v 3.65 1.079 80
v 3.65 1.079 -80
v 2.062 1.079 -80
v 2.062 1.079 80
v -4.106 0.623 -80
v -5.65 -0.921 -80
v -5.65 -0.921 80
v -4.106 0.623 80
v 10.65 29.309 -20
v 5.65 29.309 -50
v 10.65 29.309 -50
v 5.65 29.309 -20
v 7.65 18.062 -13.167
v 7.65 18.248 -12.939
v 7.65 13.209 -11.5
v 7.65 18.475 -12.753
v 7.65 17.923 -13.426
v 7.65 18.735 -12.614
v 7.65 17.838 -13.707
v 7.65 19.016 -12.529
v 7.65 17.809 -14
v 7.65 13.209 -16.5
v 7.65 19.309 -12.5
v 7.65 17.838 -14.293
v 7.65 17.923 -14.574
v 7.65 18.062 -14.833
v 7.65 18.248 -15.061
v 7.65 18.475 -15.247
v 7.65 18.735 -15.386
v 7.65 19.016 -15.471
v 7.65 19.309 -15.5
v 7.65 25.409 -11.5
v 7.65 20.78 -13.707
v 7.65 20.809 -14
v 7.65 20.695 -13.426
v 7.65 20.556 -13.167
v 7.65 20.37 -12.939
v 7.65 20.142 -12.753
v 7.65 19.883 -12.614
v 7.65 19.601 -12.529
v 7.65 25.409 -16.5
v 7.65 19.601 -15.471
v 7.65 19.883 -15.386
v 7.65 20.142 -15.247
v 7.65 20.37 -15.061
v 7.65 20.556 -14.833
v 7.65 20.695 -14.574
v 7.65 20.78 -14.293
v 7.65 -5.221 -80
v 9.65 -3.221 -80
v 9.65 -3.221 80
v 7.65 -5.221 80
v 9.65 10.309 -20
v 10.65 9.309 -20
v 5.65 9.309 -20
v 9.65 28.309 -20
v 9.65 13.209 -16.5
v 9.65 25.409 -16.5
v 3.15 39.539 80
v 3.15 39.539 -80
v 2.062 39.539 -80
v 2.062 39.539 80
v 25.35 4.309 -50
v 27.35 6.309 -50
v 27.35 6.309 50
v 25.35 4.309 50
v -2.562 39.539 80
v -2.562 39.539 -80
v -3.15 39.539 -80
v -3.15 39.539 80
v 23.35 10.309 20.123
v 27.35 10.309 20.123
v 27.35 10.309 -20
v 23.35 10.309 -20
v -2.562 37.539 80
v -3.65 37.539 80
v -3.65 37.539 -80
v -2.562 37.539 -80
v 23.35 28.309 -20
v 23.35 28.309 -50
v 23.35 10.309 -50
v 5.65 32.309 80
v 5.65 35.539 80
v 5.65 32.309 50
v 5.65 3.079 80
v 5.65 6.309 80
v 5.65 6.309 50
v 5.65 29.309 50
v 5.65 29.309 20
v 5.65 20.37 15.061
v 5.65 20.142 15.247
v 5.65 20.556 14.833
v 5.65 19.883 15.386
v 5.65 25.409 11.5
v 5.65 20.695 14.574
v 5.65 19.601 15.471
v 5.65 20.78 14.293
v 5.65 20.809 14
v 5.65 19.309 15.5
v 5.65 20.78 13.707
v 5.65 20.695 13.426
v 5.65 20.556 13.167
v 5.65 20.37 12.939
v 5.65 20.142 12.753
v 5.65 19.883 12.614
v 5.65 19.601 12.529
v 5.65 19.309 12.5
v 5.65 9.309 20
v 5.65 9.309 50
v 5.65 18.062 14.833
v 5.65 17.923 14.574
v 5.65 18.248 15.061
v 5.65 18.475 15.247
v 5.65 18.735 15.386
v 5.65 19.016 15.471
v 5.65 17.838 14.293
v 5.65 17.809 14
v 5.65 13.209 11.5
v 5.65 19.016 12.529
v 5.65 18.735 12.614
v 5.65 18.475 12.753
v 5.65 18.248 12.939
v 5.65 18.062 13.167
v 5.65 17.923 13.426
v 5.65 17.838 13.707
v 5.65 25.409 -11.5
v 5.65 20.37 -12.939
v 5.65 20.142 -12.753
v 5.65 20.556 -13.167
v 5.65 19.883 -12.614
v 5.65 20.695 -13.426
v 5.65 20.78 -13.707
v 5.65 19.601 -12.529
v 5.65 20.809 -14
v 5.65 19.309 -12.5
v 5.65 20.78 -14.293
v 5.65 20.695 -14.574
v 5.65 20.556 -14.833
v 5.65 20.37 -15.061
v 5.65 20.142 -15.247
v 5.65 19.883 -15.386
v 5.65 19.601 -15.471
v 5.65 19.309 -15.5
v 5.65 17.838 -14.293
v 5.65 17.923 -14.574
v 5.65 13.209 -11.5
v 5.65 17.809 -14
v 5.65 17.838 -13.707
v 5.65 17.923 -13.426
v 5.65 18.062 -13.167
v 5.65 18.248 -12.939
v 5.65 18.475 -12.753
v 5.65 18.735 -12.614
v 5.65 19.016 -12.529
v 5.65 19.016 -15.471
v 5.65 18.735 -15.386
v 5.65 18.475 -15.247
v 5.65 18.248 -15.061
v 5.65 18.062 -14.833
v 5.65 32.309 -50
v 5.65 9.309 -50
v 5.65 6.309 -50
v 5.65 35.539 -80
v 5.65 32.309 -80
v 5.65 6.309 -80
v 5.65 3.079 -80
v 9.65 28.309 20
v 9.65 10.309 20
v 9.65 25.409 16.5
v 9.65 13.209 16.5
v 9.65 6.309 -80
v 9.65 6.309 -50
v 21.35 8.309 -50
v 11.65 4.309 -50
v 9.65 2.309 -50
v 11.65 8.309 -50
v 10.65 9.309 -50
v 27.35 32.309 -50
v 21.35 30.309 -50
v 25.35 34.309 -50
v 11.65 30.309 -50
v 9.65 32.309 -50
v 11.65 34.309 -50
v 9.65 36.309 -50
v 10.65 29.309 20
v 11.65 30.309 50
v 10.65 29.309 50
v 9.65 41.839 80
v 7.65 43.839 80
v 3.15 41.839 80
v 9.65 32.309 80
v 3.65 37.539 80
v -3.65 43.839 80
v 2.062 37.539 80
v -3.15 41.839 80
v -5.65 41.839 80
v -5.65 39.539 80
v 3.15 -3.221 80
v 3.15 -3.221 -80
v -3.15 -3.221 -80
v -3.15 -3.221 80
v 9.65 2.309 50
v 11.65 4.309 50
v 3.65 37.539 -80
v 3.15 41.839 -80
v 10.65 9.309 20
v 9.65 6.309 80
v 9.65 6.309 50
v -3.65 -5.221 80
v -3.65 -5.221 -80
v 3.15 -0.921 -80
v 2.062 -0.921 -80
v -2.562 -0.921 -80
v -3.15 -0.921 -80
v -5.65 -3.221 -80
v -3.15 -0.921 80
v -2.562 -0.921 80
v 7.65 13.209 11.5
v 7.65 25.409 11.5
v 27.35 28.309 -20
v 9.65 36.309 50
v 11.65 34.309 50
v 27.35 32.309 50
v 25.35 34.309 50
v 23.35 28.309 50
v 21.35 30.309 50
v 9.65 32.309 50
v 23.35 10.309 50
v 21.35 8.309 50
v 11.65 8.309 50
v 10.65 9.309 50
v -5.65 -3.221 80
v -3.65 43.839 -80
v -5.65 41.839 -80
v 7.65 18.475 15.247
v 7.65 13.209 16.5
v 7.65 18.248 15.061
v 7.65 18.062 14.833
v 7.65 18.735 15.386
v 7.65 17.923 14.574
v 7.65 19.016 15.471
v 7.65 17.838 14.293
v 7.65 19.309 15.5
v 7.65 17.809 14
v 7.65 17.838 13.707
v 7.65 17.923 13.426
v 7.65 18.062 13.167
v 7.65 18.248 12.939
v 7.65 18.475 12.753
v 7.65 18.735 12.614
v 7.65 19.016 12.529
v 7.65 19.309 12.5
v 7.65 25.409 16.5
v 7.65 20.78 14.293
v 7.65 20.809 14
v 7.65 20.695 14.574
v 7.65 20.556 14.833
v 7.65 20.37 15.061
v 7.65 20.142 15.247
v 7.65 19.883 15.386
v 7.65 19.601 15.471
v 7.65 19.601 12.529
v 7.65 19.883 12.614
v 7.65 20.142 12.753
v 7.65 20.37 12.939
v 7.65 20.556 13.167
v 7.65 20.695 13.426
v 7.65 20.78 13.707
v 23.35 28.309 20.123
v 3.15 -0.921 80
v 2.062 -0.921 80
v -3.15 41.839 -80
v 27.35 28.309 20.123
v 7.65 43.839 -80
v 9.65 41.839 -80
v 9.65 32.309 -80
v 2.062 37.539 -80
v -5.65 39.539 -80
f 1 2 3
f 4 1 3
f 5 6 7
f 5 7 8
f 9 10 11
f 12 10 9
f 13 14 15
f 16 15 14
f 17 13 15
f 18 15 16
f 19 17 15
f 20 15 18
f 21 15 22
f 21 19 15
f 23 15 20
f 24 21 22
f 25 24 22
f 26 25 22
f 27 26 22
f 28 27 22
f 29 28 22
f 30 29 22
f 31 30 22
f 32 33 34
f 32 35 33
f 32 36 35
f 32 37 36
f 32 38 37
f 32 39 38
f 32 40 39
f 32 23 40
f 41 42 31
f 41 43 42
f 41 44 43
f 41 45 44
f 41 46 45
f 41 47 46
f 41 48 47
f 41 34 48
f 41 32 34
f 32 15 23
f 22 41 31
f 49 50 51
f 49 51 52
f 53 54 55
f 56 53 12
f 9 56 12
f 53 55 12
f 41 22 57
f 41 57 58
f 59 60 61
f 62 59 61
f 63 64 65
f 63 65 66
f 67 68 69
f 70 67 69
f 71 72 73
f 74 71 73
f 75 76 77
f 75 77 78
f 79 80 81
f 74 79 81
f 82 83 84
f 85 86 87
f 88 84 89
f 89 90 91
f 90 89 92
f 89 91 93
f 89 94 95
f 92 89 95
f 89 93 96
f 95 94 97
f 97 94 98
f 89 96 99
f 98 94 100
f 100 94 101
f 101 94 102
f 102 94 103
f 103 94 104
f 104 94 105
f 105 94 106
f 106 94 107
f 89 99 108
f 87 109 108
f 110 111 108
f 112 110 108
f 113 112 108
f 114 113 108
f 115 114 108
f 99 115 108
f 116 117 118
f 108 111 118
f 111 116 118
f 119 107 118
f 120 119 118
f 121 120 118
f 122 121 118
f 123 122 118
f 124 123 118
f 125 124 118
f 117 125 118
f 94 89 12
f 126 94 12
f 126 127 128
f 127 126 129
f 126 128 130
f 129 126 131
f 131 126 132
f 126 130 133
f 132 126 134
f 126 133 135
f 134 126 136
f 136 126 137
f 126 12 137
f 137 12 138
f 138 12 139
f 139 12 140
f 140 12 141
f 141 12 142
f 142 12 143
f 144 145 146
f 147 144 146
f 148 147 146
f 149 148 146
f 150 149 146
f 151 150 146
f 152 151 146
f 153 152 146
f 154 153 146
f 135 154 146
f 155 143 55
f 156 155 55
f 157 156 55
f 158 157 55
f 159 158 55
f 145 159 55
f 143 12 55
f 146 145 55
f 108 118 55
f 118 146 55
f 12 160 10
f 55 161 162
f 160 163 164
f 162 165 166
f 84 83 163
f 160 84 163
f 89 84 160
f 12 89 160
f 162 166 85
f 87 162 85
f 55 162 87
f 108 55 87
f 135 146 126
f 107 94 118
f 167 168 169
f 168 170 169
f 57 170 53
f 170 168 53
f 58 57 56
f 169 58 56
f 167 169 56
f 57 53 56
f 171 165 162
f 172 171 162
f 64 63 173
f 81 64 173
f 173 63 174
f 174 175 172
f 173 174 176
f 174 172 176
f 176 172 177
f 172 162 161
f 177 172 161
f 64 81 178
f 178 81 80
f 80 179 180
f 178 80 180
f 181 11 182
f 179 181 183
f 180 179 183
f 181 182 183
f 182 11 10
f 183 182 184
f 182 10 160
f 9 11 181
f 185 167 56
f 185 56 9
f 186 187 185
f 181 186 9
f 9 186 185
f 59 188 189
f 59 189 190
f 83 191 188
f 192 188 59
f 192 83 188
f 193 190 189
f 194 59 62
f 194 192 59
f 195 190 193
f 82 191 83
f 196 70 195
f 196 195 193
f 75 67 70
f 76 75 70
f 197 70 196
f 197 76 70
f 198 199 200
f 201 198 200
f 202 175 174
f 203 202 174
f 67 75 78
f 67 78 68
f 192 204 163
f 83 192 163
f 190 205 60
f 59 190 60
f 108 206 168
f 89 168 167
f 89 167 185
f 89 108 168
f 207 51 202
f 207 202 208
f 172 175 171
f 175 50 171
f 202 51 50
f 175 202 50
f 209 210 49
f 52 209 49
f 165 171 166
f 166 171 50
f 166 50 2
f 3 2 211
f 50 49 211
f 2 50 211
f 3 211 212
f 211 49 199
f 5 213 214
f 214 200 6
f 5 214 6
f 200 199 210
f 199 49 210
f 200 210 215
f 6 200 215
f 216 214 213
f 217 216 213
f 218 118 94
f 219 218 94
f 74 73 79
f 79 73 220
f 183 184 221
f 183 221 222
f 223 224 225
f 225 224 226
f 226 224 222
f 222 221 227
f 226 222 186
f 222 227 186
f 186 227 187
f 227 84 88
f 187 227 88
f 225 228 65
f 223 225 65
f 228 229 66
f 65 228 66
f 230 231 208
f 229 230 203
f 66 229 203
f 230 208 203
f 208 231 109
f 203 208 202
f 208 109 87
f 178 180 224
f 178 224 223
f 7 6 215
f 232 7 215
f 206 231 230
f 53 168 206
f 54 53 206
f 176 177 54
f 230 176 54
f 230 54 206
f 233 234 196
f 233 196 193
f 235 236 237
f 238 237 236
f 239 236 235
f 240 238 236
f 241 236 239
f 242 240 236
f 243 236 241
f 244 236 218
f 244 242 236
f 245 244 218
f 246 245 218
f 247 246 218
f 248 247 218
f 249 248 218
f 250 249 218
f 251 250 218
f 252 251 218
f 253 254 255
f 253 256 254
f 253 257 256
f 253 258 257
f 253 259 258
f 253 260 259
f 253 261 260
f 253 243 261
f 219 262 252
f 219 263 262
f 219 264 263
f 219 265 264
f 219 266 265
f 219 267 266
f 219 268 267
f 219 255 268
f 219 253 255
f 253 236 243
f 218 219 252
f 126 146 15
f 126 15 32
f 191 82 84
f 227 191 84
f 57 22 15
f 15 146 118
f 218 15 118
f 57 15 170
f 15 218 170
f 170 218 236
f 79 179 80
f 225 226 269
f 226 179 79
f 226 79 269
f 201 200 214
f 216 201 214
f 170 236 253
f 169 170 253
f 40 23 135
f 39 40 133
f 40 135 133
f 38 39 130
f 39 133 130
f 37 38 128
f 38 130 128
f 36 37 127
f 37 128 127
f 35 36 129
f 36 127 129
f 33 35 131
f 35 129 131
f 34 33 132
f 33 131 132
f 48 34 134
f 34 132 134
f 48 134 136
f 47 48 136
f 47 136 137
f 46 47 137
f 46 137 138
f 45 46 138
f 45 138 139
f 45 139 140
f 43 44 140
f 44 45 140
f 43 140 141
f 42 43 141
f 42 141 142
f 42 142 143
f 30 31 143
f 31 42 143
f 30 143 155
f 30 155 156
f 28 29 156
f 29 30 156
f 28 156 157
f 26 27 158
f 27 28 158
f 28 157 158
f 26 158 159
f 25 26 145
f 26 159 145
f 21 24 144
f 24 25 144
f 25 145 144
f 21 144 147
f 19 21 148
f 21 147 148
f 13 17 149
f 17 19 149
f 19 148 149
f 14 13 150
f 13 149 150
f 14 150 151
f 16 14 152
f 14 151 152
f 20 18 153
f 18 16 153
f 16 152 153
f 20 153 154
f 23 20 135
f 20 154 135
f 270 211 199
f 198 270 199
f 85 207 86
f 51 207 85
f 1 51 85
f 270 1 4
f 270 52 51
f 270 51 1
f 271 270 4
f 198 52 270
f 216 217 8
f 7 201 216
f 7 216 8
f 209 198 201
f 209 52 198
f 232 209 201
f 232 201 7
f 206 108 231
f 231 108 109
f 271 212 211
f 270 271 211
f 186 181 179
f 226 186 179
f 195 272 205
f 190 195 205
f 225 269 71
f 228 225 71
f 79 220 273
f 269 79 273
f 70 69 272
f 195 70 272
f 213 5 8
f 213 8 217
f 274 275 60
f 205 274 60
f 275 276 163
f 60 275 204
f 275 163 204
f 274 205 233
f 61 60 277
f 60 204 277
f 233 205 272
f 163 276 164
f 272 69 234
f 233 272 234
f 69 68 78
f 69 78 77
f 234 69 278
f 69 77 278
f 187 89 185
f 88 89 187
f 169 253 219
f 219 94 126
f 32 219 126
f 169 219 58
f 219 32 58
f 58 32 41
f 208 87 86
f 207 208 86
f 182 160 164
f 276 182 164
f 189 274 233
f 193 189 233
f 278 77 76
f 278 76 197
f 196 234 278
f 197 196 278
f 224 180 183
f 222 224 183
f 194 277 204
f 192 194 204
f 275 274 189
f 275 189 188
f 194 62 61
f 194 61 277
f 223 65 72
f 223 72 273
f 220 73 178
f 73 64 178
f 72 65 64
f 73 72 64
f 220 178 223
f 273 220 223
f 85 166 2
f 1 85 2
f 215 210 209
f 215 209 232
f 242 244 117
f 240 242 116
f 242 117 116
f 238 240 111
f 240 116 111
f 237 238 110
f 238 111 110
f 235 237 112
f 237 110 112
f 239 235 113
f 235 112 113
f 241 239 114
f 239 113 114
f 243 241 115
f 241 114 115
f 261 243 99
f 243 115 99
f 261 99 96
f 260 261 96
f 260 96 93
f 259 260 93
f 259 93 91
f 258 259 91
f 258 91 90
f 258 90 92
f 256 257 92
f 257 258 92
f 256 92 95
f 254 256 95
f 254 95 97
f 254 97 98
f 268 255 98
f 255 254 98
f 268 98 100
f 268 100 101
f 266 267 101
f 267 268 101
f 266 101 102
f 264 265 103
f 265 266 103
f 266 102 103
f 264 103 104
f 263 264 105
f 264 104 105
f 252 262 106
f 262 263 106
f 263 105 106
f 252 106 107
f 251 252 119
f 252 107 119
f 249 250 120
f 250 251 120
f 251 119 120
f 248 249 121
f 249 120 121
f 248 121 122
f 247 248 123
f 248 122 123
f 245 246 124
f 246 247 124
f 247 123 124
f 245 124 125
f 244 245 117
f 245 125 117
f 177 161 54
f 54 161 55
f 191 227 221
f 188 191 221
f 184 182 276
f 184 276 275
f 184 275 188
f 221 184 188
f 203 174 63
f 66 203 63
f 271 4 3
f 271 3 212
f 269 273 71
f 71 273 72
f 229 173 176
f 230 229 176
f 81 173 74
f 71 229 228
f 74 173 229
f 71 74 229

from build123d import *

# Parameters (mm, degrees)
BOSS_EXTRU_1_DEPTH      = 80
BOSS_EXTRU_1_DEPTH_BACK = 80
ESQUISSE4_R             = 1.5
ESQUISSE4_W             = 23
ESQUISSE4_H             = 12.2
ENL_V_MAT_EXTRU_1_DEPTH = 95
ENL_V_START             = -2
ESQUISSE5_W             = 5
ESQUISSE5_H             = 12.2
ESQUISSE5_R             = 1.5
ENL_V_MAT_EXTRU_2_DEPTH = 2
BOSS_EXTRU_3_DEPTH      = 50
BOSS_EXTRU_3_DEPTH_BACK = 50
CHANFREIN2_SIZE         = 2
ESQUISSE11_W            = 30
ESQUISSE11_H            = 20
ENL_V_MAT_EXTRU_4_DEPTH = 11
ENL_V_MAT_EXTRU_5_DEPTH = 8


with BuildPart() as part:
    # Esquisse1 → Boss.-Extru.1 (new, two sides: drawn at the far end of the back side and taken through both)
    with BuildSketch(Plane.XY.offset(-BOSS_EXTRU_1_DEPTH_BACK)):
        Polygon((-2.561538462, -0.921153846), (-2.561538462, 1.078846154), (-5.65, 1.078846154), (-5.65, -5.221153846), (5.65, -5.221153846), (9.45, -5.221153846), (9.65, -5.221153846), (9.65, 43.838846154), (9.45, 43.838846154), (5.65, 43.838846154), (-5.65, 43.838846154), (-5.65, 37.538846154), (-2.561538462, 37.538846154), (-2.561538462, 39.538846154), (-3.15, 39.538846154), (-3.15, 41.838846154), (3.15, 41.838846154), (3.15, 39.538846154), (2.061538462, 39.538846154), (2.061538462, 37.538846154), (5.65, 37.538846154), (5.65, 1.078846154), (2.061538462, 1.078846154), (2.061538462, -0.921153846), (3.15, -0.921153846), (3.15, -3.221153846), (-3.15, -3.221153846), (-3.15, -0.921153846), align=None)
    extrude(amount=BOSS_EXTRU_1_DEPTH + BOSS_EXTRU_1_DEPTH_BACK)

    # Esquisse4 → Enlèv. mat.-Extru.1 (cut)
    with BuildSketch(Plane.ZY.offset(-5.65)):
        with Locations((-14, 19.308846154)):
            Circle(ESQUISSE4_R)
        with Locations(Location((14, 19.308846154, 0), (0, 0, 270))):
            Circle(ESQUISSE4_R)
        with Locations((0, 19.308846154)):
            Rectangle(ESQUISSE4_W, ESQUISSE4_H)
    extrude(amount=-ENL_V_MAT_EXTRU_1_DEPTH, mode=Mode.SUBTRACT)

    # Esquisse5 → Enlèv. mat.-Extru.2 (cut)
    # profile 1 of 2: a face of its own
    with BuildSketch(Plane(origin=(9.65, 0, 0), x_dir=(0, 0, -1), z_dir=(1, 0, 0)).offset(ENL_V_START)):
        with Locations((14, 19.308846154)):
            Rectangle(ESQUISSE5_W, ESQUISSE5_H)
        with Locations(Location((14, 19.308846154, 0), (0, 0, 180))):
            Circle(ESQUISSE5_R, mode=Mode.SUBTRACT)
    # profile 2 of 2: a face of its own
    with BuildSketch(Plane(origin=(9.65, 0, 0), x_dir=(0, 0, -1), z_dir=(1, 0, 0)).offset(ENL_V_START)):
        with Locations((-14, 19.308846154)):
            Rectangle(ESQUISSE5_W, ESQUISSE5_H)
        with Locations(Location((-14, 19.308846154, 0), (0, 0, 90))):
            Circle(ESQUISSE5_R, mode=Mode.SUBTRACT)
    extrude(amount=ENL_V_MAT_EXTRU_2_DEPTH, mode=Mode.SUBTRACT)

    # Esquisse9 → Boss.-Extru.3 (add, two sides: drawn at the far end of the back side and taken through both)
    with BuildSketch(Plane.XY.offset(-BOSS_EXTRU_3_DEPTH_BACK)):
        Polygon((23.35, 4.308846154), (27.35, 4.308846154), (27.35, 8.308846154), (27.35, 30.308846154), (27.35, 34.308846154), (9.65, 34.308846154), (9.65, 30.308846154), (23.35, 30.308846154), (23.35, 8.308846154), (9.65, 8.308846154), (9.65, 4.308846154), align=None)
    extrude(amount=BOSS_EXTRU_3_DEPTH + BOSS_EXTRU_3_DEPTH_BACK)

    # Chanfrein2
    # the kernel refuses this chamfer: 2 mm, written as the material it adds along each edge
    with BuildSketch(Plane(origin=(23.35, 8.308846154, 50), x_dir=(-0.9996219169112968, -0.027495876610587375, 0), z_dir=(0, 0, -1)), Plane(origin=(9.65, 4.308846154, -50), x_dir=(-0.027495876610585623, -0.9996219169112968, 0), z_dir=(0, 0, 1))) as chanfrein2_piece_1:
        Polygon((CHANFREIN2_SIZE * 0.999621916911, CHANFREIN2_SIZE * 0.0274958766106), (-CHANFREIN2_SIZE * 0.0274958766106, CHANFREIN2_SIZE * 0.999621916911), (0, 0), align=None)
    extrude(amount=100)
    with BuildSketch(Plane(origin=(23.35, 30.308846154, 50), x_dir=(-0.9996219169112968, 0.027495876610585647, 0), z_dir=(0, 0, -1)), Plane(origin=(9.65, 30.308846154, 50), x_dir=(-0.027495876610588235, -0.9996219169112968, 0), z_dir=(0, 0, -1)), Plane(origin=(9.65, 34.308846154, -50), x_dir=(-0.02749587661058651, 0.9996219169112968, 0), z_dir=(0, 0, 1)), Plane(origin=(9.65, 8.308846154, -50), x_dir=(-0.02749587661058651, 0.9996219169112968, 0), z_dir=(0, 0, 1))) as chanfrein2_piece_2:
        Polygon((CHANFREIN2_SIZE * 0.999621916911, -CHANFREIN2_SIZE * 0.0274958766106), (-CHANFREIN2_SIZE * 0.0274958766106, -CHANFREIN2_SIZE * 0.999621916911), (0, 0), align=None)
    extrude(amount=100)
    with BuildSketch(Plane(origin=(5.65, 37.538846154, -80), x_dir=(-0.9996219169112968, 0.02749587661058563, 0), z_dir=(0, 0, 1)), Plane(origin=(5.65, 1.078846154, -80), x_dir=(0.027495876610586504, 0.9996219169112968, 0), z_dir=(0, 0, 1))) as chanfrein2_piece_3:
        Polygon((CHANFREIN2_SIZE * 0.999621916911, CHANFREIN2_SIZE * 0.0274958766106), (-CHANFREIN2_SIZE * 0.0274958766106, CHANFREIN2_SIZE * 0.999621916911), (0, 0), align=None)
    extrude(amount=160)
    # the kernel refuses this chamfer: 2 mm, written as the material it takes off along each edge
    with BuildSketch(Plane(origin=(-2.561538462, 1.078846154, -85.143365976), x_dir=(-0.9996219169112968, 0.027495876610586716, 0), z_dir=(0, 0, 1)), Plane(origin=(-5.65, 1.078846154, -85.143365976), x_dir=(-0.027495876610586487, -0.9996219169112968, 0), z_dir=(0, 0, 1)), Plane(origin=(-5.65, -5.221153846, -85.143365976), x_dir=(0.9996219169112968, -0.027495876610586494, 0), z_dir=(0, 0, 1)), Plane(origin=(9.65, -5.221153846, -85.143365976), x_dir=(0.027495876610586494, 0.9996219169112968, 0), z_dir=(0, 0, 1)), Plane(origin=(9.65, 43.838846154, -85.143365976), x_dir=(-0.9996219169112968, 0.027495876610585623, 0), z_dir=(0, 0, 1)), Plane(origin=(-5.65, 37.538846154, -85.143365976), x_dir=(0.999621916911297, -0.027495876610582174, 0), z_dir=(0, 0, 1)), Plane(origin=(-5.65, 43.838846154, -85.143365976), x_dir=(-0.02749587661058651, -0.9996219169112968, 0), z_dir=(0, 0, 1))) as chanfrein2_2_piece_1:
        Polygon((CHANFREIN2_SIZE * 0.999621916911, CHANFREIN2_SIZE * 0.0274958766106), (-CHANFREIN2_SIZE * 0.0274958766106, CHANFREIN2_SIZE * 0.999621916911), (0, 0), align=None)
    extrude(amount=170.286731952, mode=Mode.SUBTRACT)
    with BuildSketch(Plane(origin=(27.35, 4.308846154, -55.143365976), x_dir=(0.027495876610585623, 0.9996219169112968, 0), z_dir=(0, 0, 1)), Plane(origin=(27.35, 34.308846154, -55.143365976), x_dir=(-0.9996219169112968, 0.027495876610585647, 0), z_dir=(0, 0, 1))) as chanfrein2_2_piece_2:
        Polygon((CHANFREIN2_SIZE * 0.999621916911, CHANFREIN2_SIZE * 0.0274958766106), (-CHANFREIN2_SIZE * 0.0274958766106, CHANFREIN2_SIZE * 0.999621916911), (0, 0), align=None)
    extrude(amount=110.286731952, mode=Mode.SUBTRACT)

    # Esquisse11 → Enlèv. mat.-Extru.4 (cut)
    with BuildSketch(Plane.ZY.offset(-5.65)):
        Polygon((-50, 29.308846154), (-50, 32.308846154), (-80, 32.308846154), (-80, 6.308846154), (-50, 6.308846154), (-50, 9.308846154), align=None)
        Polygon((80, 32.308846154), (50, 32.308846154), (50, 29.308846154), (50, 9.308846154), (50, 6.308846154), (80, 6.308846154), align=None)
        with Locations((-35, 19.308846154)):
            Rectangle(ESQUISSE11_W, ESQUISSE11_H)
        with Locations((35, 19.308846154)):
            Rectangle(ESQUISSE11_W, ESQUISSE11_H)
    extrude(amount=-ENL_V_MAT_EXTRU_4_DEPTH, mode=Mode.SUBTRACT)

    # Esquisse12 → Enlèv. mat.-Extru.5 (cut)
    with BuildSketch(Plane(origin=(27.35, 0, 0), x_dir=(0, 0, -1), z_dir=(1, 0, 0))):
        Polygon((20, 28.308846154), (10, 28.308846154), (-10, 28.308846154), (-20.122761397, 28.308846154), (-20.122761397, 10.308846154), (-10, 10.308846154), (10, 10.308846154), (20, 10.308846154), align=None)
    extrude(amount=-ENL_V_MAT_EXTRU_5_DEPTH, mode=Mode.SUBTRACT)


solid = part.part
